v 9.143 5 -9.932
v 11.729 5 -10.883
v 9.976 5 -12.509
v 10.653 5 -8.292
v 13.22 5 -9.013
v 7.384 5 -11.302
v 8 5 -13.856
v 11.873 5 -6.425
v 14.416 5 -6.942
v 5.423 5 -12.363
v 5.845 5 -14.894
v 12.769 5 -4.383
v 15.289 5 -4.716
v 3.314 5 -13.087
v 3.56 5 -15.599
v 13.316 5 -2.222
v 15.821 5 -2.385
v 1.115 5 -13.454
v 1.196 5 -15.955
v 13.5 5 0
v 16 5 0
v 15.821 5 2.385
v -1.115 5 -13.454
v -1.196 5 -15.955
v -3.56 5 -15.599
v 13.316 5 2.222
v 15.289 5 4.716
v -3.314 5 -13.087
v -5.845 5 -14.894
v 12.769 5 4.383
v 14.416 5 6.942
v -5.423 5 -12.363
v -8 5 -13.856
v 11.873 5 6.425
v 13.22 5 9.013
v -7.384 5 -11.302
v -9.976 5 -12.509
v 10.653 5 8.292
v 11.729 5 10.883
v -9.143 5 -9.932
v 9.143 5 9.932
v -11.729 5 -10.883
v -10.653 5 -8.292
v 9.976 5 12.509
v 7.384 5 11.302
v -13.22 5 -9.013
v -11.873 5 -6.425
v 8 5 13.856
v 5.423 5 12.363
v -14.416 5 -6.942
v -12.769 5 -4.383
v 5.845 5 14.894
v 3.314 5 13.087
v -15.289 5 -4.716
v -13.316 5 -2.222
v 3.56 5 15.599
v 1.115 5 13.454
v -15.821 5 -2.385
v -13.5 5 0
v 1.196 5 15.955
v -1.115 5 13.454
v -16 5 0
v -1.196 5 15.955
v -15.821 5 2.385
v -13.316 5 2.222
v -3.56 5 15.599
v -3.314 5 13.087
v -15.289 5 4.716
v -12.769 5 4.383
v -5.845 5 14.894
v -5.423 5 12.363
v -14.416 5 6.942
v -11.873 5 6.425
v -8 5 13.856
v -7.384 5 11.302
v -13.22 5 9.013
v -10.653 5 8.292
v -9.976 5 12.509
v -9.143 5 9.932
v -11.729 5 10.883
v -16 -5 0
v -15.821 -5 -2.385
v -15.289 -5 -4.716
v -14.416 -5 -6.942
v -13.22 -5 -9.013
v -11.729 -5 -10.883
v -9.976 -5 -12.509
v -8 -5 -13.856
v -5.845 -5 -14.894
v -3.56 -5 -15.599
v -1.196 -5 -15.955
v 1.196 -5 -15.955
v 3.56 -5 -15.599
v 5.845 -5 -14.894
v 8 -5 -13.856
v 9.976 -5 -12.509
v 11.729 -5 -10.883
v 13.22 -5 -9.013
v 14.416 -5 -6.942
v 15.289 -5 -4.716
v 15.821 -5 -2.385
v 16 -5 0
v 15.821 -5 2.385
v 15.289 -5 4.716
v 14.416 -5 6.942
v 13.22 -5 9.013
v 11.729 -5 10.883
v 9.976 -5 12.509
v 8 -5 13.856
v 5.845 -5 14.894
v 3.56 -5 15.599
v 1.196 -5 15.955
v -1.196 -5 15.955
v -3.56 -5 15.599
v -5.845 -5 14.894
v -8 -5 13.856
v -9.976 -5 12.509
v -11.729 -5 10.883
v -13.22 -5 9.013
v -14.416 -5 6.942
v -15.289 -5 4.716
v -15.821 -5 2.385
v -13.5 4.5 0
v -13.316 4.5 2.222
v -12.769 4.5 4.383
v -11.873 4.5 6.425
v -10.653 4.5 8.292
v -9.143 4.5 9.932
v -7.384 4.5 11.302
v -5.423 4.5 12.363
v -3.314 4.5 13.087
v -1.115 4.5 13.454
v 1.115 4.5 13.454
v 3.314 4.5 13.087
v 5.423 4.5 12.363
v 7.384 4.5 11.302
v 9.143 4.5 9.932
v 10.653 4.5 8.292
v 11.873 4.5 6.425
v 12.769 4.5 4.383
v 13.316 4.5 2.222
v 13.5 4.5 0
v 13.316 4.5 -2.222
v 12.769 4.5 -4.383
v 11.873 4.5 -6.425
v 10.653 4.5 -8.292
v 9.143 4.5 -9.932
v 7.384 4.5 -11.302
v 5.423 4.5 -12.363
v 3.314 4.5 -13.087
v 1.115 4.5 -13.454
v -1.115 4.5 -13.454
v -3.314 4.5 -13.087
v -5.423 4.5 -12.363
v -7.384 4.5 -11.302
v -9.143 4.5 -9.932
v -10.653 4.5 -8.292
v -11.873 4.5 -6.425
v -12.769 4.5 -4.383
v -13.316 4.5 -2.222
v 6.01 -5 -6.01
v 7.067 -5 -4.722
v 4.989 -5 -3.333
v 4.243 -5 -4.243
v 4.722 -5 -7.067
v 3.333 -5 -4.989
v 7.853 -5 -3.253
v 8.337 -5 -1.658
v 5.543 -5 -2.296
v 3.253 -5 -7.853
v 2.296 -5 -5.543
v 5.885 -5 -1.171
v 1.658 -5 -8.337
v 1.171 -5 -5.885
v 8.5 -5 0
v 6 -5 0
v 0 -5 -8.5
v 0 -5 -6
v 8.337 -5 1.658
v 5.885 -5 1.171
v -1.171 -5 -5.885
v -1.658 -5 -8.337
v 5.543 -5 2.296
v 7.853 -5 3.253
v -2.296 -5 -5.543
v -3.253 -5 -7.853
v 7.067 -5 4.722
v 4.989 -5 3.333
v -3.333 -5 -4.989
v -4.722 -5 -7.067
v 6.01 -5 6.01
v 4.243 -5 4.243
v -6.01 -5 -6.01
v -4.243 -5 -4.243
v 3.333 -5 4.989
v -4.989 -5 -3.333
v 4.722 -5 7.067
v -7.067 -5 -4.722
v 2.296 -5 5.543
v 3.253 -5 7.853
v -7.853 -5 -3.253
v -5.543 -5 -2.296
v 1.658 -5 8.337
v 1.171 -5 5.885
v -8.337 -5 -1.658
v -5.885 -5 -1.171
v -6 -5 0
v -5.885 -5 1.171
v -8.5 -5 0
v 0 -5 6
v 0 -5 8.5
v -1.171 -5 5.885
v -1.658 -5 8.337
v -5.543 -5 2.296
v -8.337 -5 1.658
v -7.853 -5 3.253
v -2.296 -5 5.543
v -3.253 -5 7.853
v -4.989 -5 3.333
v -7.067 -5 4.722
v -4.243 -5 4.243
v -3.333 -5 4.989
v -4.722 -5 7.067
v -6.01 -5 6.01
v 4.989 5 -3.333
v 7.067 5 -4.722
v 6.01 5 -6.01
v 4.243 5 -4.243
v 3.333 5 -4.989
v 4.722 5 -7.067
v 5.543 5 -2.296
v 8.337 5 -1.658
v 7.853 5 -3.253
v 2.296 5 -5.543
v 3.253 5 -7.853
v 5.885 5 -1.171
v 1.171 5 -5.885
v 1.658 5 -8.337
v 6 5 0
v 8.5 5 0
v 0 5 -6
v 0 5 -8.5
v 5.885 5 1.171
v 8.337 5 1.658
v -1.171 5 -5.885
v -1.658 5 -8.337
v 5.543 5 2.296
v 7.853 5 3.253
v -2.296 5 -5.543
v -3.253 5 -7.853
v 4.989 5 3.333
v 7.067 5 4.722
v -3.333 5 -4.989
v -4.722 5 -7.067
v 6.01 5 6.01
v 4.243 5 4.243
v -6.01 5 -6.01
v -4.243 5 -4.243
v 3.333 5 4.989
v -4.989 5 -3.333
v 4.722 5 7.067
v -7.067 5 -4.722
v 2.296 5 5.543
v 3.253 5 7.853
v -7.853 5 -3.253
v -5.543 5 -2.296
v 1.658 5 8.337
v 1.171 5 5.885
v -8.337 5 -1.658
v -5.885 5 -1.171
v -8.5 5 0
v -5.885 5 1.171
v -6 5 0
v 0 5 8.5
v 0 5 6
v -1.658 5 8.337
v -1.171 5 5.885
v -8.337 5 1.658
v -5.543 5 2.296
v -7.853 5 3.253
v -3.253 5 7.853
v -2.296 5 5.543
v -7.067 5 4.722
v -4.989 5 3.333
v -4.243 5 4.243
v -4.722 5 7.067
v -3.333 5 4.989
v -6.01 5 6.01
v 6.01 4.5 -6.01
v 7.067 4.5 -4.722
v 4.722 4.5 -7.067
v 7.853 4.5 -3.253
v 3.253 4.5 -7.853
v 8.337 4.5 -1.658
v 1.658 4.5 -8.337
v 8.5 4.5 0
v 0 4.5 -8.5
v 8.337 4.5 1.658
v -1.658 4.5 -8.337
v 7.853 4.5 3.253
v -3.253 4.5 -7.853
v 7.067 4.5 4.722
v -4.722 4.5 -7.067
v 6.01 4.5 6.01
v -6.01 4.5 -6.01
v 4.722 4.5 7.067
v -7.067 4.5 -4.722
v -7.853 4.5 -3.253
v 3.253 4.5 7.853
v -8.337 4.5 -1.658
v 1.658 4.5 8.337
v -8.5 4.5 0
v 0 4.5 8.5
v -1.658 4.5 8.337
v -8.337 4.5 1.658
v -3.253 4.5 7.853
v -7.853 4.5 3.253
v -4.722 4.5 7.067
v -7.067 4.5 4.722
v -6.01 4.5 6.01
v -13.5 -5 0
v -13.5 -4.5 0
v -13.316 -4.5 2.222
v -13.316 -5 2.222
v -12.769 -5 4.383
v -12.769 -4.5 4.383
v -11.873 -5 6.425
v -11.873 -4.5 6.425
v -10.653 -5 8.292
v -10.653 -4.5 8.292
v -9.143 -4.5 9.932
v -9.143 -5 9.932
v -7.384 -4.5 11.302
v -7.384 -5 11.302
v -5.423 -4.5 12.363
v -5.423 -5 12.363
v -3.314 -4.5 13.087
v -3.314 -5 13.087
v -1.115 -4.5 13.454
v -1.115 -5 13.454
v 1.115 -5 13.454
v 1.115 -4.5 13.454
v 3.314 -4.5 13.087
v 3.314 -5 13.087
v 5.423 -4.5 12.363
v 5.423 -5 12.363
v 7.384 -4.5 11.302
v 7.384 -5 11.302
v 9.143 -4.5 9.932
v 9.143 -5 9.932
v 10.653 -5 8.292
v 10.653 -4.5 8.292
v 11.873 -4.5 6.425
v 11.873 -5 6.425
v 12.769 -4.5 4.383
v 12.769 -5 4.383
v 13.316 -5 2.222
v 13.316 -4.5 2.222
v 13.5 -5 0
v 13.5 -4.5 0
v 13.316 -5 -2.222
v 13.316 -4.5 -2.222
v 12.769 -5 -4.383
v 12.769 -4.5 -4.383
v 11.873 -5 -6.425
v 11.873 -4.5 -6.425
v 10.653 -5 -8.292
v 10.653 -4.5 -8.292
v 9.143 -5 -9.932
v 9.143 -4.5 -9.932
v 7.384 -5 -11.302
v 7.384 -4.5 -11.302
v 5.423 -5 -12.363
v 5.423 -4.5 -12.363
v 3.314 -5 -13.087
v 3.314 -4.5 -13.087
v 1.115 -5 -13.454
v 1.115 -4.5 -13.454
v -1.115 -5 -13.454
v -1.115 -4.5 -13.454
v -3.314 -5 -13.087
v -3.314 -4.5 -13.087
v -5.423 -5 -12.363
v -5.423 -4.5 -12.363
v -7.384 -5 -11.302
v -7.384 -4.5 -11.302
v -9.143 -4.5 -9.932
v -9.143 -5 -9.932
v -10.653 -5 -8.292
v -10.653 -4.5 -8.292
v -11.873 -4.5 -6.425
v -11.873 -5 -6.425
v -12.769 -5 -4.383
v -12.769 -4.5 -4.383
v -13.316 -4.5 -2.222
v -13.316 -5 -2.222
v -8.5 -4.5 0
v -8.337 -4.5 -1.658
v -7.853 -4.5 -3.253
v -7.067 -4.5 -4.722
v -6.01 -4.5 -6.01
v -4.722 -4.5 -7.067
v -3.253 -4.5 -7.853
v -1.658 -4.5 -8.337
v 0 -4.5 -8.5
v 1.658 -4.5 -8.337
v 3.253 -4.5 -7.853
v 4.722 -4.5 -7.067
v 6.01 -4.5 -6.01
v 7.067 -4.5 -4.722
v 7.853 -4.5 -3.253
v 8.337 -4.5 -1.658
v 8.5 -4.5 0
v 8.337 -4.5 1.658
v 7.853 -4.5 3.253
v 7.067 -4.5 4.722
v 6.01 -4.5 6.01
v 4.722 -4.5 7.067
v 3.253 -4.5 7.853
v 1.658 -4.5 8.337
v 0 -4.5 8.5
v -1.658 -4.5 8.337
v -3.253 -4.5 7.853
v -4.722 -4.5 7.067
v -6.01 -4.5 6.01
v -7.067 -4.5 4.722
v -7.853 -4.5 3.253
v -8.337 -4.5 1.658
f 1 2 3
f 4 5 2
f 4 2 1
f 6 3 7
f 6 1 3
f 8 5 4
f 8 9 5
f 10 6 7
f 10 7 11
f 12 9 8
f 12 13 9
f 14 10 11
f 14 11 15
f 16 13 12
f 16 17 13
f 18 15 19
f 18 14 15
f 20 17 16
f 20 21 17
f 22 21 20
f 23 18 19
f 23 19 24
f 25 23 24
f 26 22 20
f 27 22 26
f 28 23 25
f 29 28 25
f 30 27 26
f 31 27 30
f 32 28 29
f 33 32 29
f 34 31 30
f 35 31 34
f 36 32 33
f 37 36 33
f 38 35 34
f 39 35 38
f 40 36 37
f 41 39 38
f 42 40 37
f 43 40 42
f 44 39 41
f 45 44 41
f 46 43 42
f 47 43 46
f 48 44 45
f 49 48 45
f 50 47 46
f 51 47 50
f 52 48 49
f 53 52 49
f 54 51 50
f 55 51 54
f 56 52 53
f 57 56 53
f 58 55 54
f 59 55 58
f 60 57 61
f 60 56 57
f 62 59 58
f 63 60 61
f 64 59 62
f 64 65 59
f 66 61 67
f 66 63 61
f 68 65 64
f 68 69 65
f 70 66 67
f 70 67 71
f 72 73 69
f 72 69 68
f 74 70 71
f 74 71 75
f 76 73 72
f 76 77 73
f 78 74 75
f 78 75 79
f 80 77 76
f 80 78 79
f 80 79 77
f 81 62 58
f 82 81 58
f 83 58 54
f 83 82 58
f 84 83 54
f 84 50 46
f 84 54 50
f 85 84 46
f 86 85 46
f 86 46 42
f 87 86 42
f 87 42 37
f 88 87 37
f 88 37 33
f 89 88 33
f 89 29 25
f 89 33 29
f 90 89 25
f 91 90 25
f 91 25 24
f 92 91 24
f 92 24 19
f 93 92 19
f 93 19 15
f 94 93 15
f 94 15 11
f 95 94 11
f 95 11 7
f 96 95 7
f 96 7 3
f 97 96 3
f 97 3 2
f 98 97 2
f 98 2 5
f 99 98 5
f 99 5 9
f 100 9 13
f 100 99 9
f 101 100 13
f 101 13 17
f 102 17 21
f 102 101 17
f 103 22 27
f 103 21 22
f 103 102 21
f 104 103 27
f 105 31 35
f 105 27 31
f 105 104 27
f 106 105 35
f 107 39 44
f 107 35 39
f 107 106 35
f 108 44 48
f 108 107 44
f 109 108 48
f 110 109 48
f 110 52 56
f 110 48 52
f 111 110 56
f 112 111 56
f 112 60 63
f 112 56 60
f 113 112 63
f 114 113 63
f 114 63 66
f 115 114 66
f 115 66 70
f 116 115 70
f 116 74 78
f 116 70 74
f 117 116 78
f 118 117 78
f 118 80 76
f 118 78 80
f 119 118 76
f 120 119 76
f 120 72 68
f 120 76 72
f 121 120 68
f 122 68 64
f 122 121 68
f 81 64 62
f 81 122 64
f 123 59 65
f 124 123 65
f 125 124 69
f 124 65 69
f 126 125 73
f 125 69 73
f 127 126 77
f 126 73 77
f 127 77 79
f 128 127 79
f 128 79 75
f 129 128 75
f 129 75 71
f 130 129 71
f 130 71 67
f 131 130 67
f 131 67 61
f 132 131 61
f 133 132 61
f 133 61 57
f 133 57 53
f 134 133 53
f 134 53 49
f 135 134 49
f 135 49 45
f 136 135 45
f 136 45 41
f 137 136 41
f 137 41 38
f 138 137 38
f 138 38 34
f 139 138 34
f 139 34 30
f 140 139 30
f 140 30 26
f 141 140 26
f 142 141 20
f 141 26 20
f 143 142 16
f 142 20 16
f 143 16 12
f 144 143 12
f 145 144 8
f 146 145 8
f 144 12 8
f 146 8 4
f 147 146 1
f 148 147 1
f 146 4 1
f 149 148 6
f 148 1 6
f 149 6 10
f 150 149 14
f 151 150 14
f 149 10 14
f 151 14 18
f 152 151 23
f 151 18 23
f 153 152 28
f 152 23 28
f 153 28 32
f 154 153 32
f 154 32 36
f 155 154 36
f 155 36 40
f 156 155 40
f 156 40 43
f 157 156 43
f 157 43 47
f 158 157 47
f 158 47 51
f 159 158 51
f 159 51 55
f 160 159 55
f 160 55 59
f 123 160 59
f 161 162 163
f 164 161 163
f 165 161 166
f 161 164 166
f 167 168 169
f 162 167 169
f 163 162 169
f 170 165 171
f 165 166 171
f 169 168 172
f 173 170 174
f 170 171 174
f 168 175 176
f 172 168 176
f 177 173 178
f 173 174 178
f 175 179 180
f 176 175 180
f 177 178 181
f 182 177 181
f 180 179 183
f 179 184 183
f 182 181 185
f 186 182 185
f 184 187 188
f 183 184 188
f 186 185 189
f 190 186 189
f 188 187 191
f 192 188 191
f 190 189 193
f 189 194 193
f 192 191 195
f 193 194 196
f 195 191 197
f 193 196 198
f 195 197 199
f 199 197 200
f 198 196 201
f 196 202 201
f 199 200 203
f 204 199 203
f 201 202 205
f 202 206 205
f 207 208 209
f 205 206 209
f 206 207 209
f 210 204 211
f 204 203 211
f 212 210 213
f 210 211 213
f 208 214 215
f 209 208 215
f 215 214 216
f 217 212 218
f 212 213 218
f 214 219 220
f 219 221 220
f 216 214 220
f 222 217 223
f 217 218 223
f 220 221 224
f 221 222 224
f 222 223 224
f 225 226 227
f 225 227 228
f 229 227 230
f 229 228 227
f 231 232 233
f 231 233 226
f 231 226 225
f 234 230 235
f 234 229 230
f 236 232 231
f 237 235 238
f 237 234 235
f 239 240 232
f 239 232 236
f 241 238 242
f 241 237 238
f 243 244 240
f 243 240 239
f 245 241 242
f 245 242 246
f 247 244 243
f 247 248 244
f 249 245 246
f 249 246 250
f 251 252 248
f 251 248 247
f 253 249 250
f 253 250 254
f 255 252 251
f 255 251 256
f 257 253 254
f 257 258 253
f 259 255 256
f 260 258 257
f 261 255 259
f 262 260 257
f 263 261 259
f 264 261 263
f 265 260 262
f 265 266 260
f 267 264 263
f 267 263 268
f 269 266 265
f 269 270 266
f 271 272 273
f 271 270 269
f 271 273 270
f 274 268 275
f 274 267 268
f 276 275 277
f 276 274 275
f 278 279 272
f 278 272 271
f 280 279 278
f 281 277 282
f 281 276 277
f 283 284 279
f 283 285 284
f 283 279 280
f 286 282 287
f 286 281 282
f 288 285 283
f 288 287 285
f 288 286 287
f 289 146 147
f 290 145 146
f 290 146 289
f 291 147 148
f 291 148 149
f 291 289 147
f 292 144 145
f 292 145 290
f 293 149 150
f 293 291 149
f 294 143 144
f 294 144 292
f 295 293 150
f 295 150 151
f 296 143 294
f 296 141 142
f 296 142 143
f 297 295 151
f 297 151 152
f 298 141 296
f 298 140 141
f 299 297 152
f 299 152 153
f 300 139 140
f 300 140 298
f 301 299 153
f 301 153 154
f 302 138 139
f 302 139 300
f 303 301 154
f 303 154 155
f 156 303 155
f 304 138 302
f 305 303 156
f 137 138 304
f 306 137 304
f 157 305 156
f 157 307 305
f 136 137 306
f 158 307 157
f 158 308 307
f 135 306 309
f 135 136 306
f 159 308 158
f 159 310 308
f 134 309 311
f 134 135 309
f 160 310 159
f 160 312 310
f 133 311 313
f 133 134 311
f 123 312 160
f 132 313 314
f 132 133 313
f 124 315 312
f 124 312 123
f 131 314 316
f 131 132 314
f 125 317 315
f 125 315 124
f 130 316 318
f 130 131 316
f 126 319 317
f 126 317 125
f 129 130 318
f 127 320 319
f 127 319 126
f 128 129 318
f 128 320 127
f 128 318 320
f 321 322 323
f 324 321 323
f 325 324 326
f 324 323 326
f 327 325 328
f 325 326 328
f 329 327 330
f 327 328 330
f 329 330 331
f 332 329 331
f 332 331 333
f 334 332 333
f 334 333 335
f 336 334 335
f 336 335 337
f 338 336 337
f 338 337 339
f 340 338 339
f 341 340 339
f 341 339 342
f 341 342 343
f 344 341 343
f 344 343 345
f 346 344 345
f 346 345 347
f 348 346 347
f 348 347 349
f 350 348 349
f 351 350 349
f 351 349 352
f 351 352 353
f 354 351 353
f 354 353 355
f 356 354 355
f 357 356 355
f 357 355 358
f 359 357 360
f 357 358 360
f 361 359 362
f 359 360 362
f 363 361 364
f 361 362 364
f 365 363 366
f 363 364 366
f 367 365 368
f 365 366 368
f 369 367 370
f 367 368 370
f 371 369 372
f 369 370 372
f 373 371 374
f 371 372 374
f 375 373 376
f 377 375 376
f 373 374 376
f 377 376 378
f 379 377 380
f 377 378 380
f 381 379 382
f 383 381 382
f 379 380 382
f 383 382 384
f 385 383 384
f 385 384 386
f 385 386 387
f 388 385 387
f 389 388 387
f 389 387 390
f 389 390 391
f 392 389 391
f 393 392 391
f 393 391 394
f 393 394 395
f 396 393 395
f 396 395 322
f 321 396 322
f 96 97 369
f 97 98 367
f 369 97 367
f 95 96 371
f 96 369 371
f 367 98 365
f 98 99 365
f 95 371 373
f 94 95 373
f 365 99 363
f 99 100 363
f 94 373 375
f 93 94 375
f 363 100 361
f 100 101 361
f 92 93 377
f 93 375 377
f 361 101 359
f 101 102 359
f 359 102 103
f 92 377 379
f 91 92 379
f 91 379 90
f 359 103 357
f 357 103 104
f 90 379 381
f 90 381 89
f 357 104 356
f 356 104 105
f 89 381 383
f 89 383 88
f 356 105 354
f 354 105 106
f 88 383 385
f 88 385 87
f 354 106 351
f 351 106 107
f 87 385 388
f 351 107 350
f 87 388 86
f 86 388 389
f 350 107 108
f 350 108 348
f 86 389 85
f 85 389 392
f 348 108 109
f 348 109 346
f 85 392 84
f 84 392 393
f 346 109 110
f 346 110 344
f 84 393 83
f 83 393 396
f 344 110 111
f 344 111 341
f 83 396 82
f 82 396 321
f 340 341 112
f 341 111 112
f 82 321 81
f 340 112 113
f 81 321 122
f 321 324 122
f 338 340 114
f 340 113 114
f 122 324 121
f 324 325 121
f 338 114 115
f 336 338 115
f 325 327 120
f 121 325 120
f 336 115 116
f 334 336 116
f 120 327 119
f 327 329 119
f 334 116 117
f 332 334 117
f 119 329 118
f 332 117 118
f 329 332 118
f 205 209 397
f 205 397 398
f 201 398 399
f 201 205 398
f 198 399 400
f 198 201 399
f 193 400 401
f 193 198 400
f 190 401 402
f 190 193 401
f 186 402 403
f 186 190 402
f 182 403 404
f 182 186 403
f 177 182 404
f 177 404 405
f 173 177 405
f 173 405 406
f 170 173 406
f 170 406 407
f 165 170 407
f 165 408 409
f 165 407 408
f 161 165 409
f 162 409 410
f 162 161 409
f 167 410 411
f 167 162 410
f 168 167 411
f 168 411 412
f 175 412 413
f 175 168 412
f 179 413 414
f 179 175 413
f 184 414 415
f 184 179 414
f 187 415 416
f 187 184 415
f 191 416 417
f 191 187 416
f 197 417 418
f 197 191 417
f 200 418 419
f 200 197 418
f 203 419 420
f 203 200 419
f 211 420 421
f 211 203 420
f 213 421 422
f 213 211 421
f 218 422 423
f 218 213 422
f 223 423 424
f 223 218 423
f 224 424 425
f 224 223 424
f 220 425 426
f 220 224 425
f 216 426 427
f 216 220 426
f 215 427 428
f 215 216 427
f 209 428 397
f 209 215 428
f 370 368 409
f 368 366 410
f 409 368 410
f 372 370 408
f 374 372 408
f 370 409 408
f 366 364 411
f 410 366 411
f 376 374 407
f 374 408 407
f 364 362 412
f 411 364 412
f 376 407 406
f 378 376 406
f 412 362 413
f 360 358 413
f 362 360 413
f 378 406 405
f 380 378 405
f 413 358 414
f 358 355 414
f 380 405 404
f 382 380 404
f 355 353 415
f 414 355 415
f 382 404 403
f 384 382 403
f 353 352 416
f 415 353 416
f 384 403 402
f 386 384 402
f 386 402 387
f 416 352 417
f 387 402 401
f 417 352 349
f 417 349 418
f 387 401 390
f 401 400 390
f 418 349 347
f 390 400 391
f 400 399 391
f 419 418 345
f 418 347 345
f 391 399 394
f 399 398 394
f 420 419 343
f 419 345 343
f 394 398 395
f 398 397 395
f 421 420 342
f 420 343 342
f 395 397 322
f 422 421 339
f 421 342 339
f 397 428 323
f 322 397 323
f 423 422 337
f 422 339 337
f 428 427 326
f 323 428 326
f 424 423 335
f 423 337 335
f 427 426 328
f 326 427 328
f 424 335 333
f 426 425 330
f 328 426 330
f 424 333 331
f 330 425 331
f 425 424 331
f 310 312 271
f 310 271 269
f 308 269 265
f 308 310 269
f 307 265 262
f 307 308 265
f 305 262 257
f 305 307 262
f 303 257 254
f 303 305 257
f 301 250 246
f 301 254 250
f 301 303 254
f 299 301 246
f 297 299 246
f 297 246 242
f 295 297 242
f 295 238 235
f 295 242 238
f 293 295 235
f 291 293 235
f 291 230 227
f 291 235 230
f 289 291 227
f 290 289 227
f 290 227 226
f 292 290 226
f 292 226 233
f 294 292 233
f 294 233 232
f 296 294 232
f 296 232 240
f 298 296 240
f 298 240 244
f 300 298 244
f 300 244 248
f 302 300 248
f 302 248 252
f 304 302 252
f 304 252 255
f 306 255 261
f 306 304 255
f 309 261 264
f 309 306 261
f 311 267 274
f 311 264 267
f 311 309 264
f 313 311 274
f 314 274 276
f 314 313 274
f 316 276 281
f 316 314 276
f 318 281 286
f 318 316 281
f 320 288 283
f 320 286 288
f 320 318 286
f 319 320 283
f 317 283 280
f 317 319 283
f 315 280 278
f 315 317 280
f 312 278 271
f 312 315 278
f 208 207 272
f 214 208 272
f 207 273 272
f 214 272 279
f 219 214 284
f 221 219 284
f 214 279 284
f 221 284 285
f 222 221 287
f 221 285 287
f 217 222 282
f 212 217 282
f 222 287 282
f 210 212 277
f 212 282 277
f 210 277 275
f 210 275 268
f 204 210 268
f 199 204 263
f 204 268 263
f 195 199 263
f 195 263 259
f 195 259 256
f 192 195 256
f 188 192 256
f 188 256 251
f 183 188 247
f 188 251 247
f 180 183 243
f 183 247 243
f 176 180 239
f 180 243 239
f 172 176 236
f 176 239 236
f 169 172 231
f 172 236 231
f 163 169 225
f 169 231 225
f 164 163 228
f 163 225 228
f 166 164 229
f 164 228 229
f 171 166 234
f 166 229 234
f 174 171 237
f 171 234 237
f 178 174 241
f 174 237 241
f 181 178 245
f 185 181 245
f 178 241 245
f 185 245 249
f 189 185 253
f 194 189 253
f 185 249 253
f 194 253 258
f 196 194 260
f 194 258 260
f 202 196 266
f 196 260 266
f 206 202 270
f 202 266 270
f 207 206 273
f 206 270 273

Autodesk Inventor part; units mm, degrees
ref_plane "YZ Plane" through (0, 0, 0) normal (1, 0, 0) x (0, 1, 0)
ref_plane "XZ Plane" through (0, 0, 0) normal (0, 1, 0) x (-1, 0, 0)
ref_plane "XY Plane" through (0, 0, 0) normal (0, 0, 1) x (1, 0, 0)
sketch "Sketch2" plane through (0, 0, 0) normal (0, 0, 1) x (1, 0, 0)
  line L0 (0, 0) -> (0, 4.9506) construction
  line L1 (-8.5, -5) -> (-6, -5)
  line L2 (-6, -5) -> (-6, 5)
  line L3 (-6, 5) -> (-8.5, 5)
  line L4 (-8.5, 5) -> (-8.5, -5)
  line L5 (-8.5, -5) -> (-6, 5) construction
  line L6 (-6, -5) -> (-8.5, 5) construction
  line L7 (-16, -5) -> (-13.5, -5)
  line L8 (-13.5, -5) -> (-13.5, 5)
  line L9 (-13.5, 5) -> (-16, 5)
  line L10 (-16, 5) -> (-16, -5)
  line L11 (-16, -5) -> (-13.5, 5) construction
  line L12 (-13.5, -5) -> (-16, 5) construction
  line L13 (-13.5, -4.5) -> (-8.5, -4.5)
  line L14 (-8.5, -4.5) -> (-8.5, 4.5)
  line L15 (-8.5, 4.5) -> (-13.5, 4.5)
  line L16 (-13.5, 4.5) -> (-13.5, -4.5)
  line L17 (-13.5, -4.5) -> (-8.5, 4.5) construction
  line L18 (-8.5, -4.5) -> (-13.5, 4.5) construction
  point P0 (-7.25, 0)
  point P1 (-14.75, 0)
  point P2 (-11, 0)
  point P3 (-14.75, 0)
  point P4 (-7.25, 0)
  dimension "d11" = 12
  dimension "d12" = 32
  dimension "d13" = 2.5
  dimension "d14" = 2.5
  dimension "d15" = 10
  dimension "d16" = 9
revolve "Revolution1" add sketch "Sketch2" angle 360 about axis through (0, 0, 0) along (0, 1, 0)
properties part number "P03 - Bearing 62012" material "SAE 1020"
